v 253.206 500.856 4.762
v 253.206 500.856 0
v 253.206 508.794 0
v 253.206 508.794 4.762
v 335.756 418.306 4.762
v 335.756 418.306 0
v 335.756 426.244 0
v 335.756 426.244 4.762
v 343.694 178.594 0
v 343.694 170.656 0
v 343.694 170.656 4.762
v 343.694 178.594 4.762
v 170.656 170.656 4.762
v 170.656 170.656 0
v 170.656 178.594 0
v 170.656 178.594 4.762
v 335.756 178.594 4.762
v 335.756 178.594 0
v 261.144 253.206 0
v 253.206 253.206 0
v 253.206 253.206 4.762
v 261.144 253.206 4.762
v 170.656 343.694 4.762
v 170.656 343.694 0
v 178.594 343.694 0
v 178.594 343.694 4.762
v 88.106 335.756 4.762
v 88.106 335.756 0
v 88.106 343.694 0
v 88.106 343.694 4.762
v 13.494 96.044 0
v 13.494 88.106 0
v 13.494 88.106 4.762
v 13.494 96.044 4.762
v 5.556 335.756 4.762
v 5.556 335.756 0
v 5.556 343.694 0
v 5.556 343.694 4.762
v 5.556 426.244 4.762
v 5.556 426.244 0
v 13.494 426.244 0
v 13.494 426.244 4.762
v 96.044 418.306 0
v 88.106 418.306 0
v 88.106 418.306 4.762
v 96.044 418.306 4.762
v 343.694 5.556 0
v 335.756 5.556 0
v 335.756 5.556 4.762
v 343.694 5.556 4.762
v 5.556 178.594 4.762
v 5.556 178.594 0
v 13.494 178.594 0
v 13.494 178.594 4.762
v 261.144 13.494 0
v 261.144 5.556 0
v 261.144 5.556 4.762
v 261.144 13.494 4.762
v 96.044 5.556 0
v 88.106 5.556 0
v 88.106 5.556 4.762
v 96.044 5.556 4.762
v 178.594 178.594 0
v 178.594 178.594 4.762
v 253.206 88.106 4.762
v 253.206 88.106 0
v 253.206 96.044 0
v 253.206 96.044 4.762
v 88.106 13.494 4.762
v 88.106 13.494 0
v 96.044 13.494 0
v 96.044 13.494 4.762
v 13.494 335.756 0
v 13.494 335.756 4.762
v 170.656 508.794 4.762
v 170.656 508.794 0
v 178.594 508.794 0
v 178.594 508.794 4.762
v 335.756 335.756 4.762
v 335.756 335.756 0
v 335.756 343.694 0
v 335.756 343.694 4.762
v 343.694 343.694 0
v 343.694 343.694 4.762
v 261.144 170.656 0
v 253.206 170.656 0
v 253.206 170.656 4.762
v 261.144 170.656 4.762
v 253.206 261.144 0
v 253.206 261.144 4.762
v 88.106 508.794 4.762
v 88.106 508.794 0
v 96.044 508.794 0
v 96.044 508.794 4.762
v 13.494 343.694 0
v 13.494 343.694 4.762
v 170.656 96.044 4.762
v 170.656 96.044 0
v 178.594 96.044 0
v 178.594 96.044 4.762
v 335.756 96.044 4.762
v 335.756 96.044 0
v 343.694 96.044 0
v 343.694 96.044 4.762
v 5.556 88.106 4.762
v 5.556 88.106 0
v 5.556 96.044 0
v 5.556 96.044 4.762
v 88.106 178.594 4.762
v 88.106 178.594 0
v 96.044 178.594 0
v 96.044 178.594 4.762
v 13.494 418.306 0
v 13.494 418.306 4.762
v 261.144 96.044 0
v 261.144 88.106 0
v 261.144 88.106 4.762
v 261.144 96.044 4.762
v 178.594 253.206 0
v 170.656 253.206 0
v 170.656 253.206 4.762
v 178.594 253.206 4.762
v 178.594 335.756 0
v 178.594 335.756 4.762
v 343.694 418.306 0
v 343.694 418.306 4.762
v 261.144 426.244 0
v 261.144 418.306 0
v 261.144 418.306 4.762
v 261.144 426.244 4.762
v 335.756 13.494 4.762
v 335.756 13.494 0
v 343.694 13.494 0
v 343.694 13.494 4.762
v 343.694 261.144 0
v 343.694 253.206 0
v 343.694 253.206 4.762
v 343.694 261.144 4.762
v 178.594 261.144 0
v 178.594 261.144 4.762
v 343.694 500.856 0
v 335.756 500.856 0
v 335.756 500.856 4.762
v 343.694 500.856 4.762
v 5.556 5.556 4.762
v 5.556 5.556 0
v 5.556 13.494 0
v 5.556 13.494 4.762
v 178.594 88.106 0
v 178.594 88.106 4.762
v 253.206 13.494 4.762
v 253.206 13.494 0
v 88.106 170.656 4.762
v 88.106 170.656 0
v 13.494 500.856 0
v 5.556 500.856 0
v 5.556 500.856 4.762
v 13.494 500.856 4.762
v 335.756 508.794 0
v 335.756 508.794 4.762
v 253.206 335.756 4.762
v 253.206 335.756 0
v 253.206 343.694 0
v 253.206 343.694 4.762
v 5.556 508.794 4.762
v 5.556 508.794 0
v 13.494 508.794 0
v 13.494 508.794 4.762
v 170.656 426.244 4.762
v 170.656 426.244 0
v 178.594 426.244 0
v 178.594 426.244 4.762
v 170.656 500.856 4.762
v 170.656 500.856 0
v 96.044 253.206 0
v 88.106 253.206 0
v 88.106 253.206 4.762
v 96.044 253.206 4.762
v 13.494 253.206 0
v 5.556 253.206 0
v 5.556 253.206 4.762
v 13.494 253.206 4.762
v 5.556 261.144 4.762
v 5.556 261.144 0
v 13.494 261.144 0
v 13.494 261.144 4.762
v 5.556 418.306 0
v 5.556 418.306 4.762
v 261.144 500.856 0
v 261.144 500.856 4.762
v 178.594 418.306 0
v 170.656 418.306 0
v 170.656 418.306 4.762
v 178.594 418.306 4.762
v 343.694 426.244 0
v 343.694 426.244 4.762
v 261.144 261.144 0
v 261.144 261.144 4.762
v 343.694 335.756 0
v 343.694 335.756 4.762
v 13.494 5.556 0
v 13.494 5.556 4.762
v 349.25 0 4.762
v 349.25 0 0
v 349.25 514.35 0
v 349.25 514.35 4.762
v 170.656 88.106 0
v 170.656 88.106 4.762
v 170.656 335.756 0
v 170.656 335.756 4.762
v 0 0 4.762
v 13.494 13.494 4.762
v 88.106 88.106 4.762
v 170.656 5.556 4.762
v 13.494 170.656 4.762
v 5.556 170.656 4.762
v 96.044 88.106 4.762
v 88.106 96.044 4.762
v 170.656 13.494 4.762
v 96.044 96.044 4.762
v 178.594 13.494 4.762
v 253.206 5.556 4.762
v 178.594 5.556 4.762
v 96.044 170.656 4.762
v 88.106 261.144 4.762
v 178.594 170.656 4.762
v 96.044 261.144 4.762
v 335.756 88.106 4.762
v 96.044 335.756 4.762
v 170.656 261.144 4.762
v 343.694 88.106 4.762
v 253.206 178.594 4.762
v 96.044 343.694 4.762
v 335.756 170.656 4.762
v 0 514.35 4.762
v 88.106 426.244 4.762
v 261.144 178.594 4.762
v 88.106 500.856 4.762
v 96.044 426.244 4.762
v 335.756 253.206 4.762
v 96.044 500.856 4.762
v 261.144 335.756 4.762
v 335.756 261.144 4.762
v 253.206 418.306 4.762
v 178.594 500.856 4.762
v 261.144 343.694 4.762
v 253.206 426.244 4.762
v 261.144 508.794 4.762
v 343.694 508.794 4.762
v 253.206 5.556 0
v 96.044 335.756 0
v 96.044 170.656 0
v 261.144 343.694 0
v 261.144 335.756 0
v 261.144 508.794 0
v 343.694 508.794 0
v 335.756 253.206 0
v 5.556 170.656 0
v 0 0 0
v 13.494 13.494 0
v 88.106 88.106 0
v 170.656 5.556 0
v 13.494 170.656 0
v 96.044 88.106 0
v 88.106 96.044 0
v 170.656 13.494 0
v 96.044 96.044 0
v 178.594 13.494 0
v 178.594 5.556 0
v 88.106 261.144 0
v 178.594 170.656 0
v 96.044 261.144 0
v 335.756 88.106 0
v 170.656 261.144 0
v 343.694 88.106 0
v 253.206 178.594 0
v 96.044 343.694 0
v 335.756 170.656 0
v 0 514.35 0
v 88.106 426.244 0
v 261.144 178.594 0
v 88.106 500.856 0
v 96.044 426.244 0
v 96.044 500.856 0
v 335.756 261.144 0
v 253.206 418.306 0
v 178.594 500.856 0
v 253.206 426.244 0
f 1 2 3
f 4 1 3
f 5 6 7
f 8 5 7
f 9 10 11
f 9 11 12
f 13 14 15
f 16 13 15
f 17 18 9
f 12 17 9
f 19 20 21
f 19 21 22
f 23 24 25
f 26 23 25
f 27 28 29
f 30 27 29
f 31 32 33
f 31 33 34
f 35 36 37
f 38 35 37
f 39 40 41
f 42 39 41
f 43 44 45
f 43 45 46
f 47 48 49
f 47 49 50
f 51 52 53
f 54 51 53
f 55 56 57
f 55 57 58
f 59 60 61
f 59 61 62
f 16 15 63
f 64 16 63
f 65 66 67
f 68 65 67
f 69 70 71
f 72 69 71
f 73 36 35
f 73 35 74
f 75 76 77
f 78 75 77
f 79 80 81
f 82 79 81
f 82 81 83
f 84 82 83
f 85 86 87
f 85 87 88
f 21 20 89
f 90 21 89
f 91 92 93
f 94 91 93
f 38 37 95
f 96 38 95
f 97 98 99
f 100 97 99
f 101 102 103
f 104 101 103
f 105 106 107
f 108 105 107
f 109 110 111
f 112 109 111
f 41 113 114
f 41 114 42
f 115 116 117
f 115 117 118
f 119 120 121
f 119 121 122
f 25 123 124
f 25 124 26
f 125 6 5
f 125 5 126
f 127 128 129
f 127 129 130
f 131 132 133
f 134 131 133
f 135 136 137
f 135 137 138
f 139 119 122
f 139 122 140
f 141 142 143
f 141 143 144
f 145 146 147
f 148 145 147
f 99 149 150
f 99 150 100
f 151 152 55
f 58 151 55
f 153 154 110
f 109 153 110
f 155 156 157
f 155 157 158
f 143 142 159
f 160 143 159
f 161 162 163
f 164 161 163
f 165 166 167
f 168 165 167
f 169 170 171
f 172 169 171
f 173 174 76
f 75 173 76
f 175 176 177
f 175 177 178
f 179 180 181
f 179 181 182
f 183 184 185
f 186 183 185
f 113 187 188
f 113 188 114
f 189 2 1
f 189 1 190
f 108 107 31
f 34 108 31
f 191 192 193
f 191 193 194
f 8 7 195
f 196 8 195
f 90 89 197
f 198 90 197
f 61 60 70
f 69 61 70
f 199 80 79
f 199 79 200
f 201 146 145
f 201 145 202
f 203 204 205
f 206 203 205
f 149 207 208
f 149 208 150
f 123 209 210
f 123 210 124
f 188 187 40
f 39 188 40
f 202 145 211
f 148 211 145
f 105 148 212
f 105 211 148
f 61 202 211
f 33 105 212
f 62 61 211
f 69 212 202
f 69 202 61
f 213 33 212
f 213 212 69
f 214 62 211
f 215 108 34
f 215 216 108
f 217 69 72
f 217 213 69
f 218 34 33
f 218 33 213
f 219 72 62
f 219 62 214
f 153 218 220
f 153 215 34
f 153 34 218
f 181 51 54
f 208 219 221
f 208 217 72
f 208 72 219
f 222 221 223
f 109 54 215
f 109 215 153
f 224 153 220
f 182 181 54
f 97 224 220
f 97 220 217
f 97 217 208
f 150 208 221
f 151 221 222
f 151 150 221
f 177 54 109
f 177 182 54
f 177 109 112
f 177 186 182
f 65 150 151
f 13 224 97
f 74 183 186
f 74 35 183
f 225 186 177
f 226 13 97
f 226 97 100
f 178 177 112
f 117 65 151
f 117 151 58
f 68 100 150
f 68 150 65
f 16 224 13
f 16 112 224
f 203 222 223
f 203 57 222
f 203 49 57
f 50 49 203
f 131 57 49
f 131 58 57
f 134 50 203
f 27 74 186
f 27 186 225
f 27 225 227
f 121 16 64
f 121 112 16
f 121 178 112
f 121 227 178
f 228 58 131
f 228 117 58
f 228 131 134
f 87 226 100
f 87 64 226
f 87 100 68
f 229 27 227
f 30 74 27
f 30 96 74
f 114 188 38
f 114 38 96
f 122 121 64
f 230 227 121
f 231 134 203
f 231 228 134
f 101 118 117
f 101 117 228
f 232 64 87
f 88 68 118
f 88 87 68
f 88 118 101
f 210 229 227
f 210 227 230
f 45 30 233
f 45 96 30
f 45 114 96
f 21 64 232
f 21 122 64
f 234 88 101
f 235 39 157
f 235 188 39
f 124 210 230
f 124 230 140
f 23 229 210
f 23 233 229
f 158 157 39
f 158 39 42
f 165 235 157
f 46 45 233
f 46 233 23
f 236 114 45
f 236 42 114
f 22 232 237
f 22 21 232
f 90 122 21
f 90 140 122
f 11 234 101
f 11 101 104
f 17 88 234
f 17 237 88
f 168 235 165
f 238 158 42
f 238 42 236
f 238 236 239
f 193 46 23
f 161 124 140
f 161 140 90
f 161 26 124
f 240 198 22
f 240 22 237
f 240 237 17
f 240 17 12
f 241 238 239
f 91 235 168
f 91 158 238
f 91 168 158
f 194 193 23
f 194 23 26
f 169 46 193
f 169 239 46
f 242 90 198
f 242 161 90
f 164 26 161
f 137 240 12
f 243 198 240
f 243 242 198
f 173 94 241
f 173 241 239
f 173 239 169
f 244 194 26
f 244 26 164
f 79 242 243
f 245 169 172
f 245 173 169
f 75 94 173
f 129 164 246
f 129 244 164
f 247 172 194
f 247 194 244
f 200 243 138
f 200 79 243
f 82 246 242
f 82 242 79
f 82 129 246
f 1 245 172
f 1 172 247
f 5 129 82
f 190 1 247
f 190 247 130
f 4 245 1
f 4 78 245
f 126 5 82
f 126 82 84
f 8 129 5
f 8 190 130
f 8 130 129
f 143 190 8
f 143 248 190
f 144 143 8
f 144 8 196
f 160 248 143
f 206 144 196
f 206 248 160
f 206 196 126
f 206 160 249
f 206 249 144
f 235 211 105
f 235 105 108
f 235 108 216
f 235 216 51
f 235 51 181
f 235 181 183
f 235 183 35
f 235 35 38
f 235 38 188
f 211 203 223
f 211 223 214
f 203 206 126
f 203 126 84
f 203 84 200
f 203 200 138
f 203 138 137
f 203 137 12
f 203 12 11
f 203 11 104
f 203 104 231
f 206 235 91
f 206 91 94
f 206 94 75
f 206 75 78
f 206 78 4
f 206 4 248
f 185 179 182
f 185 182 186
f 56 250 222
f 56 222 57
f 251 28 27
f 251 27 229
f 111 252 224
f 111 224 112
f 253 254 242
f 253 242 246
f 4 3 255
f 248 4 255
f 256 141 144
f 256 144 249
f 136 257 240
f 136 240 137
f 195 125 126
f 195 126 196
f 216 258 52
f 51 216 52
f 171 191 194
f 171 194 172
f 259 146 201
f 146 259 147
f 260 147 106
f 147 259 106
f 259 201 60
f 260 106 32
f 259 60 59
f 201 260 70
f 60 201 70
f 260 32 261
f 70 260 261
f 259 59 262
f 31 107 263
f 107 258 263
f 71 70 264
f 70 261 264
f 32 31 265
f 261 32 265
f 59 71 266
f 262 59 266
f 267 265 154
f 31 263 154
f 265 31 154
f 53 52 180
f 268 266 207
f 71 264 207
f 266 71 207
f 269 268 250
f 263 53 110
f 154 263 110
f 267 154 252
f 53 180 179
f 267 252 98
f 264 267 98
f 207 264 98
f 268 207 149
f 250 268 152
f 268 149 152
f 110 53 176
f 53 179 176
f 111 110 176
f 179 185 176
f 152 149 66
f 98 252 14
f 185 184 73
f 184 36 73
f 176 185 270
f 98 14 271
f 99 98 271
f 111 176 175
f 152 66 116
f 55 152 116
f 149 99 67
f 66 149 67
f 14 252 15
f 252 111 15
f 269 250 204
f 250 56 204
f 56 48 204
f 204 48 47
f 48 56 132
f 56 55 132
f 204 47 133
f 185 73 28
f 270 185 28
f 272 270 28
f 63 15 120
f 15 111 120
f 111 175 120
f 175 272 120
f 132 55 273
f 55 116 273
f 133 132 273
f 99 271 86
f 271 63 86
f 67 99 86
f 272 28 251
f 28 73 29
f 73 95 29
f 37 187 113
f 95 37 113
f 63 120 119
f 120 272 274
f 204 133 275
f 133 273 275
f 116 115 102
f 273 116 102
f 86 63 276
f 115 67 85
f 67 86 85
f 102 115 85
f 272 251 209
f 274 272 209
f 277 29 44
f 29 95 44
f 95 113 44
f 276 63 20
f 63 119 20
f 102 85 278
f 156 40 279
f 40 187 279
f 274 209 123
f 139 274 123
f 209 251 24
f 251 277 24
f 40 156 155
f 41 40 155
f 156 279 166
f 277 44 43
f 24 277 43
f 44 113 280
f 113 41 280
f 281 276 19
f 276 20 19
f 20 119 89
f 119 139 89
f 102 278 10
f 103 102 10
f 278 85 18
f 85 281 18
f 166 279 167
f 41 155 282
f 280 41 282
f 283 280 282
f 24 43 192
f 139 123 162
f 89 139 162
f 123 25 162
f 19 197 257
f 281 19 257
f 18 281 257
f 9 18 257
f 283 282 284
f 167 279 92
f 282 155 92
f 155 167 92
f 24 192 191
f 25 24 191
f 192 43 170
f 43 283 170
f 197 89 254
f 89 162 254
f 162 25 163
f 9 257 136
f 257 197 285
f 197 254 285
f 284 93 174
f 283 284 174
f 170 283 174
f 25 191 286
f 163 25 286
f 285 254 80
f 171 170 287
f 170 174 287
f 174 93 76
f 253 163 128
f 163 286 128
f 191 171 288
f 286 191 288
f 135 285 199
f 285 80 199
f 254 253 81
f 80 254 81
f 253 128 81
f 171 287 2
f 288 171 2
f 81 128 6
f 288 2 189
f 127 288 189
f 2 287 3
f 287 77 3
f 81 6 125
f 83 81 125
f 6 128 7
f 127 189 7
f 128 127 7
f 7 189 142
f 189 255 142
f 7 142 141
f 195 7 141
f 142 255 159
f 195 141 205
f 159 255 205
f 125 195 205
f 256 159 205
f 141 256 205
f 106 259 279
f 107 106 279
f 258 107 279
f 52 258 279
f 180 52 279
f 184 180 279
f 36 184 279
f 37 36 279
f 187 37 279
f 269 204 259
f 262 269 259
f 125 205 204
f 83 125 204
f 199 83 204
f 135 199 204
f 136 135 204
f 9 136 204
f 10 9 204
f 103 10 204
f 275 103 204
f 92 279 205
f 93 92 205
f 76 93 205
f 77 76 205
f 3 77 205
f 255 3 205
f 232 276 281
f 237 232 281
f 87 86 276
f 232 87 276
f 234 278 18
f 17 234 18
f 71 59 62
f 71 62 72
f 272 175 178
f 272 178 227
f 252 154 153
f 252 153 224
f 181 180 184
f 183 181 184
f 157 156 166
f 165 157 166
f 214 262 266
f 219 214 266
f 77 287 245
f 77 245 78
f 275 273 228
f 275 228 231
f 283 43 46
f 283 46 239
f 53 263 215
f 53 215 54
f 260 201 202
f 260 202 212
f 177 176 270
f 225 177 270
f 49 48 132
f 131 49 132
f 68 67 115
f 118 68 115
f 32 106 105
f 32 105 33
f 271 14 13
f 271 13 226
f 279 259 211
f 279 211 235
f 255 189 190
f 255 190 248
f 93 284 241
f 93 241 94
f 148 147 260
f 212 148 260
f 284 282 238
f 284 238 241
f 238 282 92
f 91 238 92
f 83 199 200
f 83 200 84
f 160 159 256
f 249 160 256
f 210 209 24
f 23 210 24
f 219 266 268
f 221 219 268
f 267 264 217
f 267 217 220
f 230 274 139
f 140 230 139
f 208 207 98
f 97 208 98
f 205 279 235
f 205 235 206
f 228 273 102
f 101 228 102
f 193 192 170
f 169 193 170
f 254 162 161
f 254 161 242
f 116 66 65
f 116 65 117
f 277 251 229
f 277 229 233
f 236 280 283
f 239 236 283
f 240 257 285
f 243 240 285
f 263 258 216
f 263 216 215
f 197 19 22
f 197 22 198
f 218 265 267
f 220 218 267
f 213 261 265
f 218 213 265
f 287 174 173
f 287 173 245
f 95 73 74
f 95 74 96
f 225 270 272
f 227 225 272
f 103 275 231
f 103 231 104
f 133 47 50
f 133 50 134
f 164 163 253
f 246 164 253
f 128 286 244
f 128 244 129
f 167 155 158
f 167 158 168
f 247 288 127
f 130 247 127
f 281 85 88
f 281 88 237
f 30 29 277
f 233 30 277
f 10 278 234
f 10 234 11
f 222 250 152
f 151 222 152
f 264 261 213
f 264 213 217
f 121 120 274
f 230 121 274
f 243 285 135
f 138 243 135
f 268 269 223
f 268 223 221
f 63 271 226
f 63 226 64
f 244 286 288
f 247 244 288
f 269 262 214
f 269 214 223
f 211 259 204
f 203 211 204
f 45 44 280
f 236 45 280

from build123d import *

# Parameters (mm, degrees)
F0_W     = 349.25
F0_H     = 514.35
F0_W_2   = 7.9375
F0_H_2   = 7.9375
F1_DEPTH = 4.7625


with BuildPart() as f1:
    # F0 (on Top) → F1 (new body)
    with BuildSketch(Plane.XY):
        with Locations((174.625, 257.175)):
            Rectangle(F0_W, F0_H)
        with Locations((9.525, 9.525)):
            Rectangle(F0_W_2, F0_H_2, mode=Mode.SUBTRACT)
        with Locations((9.525, 92.075)):
            Rectangle(F0_W_2, F0_H_2, mode=Mode.SUBTRACT)
        with Locations((92.075, 9.525)):
            Rectangle(F0_W_2, F0_H_2, mode=Mode.SUBTRACT)
        with Locations((92.075, 92.075)):
            Rectangle(F0_W_2, F0_H_2, mode=Mode.SUBTRACT)
        with Locations((9.525, 174.625)):
            Rectangle(F0_W_2, F0_H_2, mode=Mode.SUBTRACT)
        with Locations((92.075, 174.625)):
            Rectangle(F0_W_2, F0_H_2, mode=Mode.SUBTRACT)
        with Locations((174.625, 9.525)):
            Rectangle(F0_W_2, F0_H_2, mode=Mode.SUBTRACT)
        with Locations((257.175, 9.525)):
            Rectangle(F0_W_2, F0_H_2, mode=Mode.SUBTRACT)
        with Locations((174.625, 92.075)):
            Rectangle(F0_W_2, F0_H_2, mode=Mode.SUBTRACT)
        with Locations((257.175, 92.075)):
            Rectangle(F0_W_2, F0_H_2, mode=Mode.SUBTRACT)
        with Locations((339.725, 9.525)):
            Rectangle(F0_W_2, F0_H_2, mode=Mode.SUBTRACT)
        with Locations((339.725, 92.075)):
            Rectangle(F0_W_2, F0_H_2, mode=Mode.SUBTRACT)
        with Locations((174.625, 174.625)):
            Rectangle(F0_W_2, F0_H_2, mode=Mode.SUBTRACT)
        with Locations((257.175, 174.625)):
            Rectangle(F0_W_2, F0_H_2, mode=Mode.SUBTRACT)
        with Locations((339.725, 174.625)):
            Rectangle(F0_W_2, F0_H_2, mode=Mode.SUBTRACT)
        with Locations((9.525, 257.175)):
            Rectangle(F0_W_2, F0_H_2, mode=Mode.SUBTRACT)
        with Locations((9.525, 339.725)):
            Rectangle(F0_W_2, F0_H_2, mode=Mode.SUBTRACT)
        with Locations((92.075, 257.175)):
            Rectangle(F0_W_2, F0_H_2, mode=Mode.SUBTRACT)
        with Locations((92.075, 339.725)):
            Rectangle(F0_W_2, F0_H_2, mode=Mode.SUBTRACT)
        with Locations((9.525, 422.275)):
            Rectangle(F0_W_2, F0_H_2, mode=Mode.SUBTRACT)
        with Locations((9.525, 504.825)):
            Rectangle(F0_W_2, F0_H_2, mode=Mode.SUBTRACT)
        with Locations((92.075, 422.275)):
            Rectangle(F0_W_2, F0_H_2, mode=Mode.SUBTRACT)
        with Locations((92.075, 504.825)):
            Rectangle(F0_W_2, F0_H_2, mode=Mode.SUBTRACT)
        with Locations((174.625, 257.175)):
            Rectangle(F0_W_2, F0_H_2, mode=Mode.SUBTRACT)
        with Locations((257.175, 257.175)):
            Rectangle(F0_W_2, F0_H_2, mode=Mode.SUBTRACT)
        with Locations((174.625, 339.725)):
            Rectangle(F0_W_2, F0_H_2, mode=Mode.SUBTRACT)
        with Locations((257.175, 339.725)):
            Rectangle(F0_W_2, F0_H_2, mode=Mode.SUBTRACT)
        with Locations((339.725, 257.175)):
            Rectangle(F0_W_2, F0_H_2, mode=Mode.SUBTRACT)
        with Locations((339.725, 339.725)):
            Rectangle(F0_W_2, F0_H_2, mode=Mode.SUBTRACT)
        with Locations((174.625, 422.275)):
            Rectangle(F0_W_2, F0_H_2, mode=Mode.SUBTRACT)
        with Locations((257.175, 422.275)):
            Rectangle(F0_W_2, F0_H_2, mode=Mode.SUBTRACT)
        with Locations((174.625, 504.825)):
            Rectangle(F0_W_2, F0_H_2, mode=Mode.SUBTRACT)
        with Locations((257.175, 504.825)):
            Rectangle(F0_W_2, F0_H_2, mode=Mode.SUBTRACT)
        with Locations((339.725, 422.275)):
            Rectangle(F0_W_2, F0_H_2, mode=Mode.SUBTRACT)
        with Locations((339.725, 504.825)):
            Rectangle(F0_W_2, F0_H_2, mode=Mode.SUBTRACT)
    extrude(amount=F1_DEPTH)


solid = f1.part
